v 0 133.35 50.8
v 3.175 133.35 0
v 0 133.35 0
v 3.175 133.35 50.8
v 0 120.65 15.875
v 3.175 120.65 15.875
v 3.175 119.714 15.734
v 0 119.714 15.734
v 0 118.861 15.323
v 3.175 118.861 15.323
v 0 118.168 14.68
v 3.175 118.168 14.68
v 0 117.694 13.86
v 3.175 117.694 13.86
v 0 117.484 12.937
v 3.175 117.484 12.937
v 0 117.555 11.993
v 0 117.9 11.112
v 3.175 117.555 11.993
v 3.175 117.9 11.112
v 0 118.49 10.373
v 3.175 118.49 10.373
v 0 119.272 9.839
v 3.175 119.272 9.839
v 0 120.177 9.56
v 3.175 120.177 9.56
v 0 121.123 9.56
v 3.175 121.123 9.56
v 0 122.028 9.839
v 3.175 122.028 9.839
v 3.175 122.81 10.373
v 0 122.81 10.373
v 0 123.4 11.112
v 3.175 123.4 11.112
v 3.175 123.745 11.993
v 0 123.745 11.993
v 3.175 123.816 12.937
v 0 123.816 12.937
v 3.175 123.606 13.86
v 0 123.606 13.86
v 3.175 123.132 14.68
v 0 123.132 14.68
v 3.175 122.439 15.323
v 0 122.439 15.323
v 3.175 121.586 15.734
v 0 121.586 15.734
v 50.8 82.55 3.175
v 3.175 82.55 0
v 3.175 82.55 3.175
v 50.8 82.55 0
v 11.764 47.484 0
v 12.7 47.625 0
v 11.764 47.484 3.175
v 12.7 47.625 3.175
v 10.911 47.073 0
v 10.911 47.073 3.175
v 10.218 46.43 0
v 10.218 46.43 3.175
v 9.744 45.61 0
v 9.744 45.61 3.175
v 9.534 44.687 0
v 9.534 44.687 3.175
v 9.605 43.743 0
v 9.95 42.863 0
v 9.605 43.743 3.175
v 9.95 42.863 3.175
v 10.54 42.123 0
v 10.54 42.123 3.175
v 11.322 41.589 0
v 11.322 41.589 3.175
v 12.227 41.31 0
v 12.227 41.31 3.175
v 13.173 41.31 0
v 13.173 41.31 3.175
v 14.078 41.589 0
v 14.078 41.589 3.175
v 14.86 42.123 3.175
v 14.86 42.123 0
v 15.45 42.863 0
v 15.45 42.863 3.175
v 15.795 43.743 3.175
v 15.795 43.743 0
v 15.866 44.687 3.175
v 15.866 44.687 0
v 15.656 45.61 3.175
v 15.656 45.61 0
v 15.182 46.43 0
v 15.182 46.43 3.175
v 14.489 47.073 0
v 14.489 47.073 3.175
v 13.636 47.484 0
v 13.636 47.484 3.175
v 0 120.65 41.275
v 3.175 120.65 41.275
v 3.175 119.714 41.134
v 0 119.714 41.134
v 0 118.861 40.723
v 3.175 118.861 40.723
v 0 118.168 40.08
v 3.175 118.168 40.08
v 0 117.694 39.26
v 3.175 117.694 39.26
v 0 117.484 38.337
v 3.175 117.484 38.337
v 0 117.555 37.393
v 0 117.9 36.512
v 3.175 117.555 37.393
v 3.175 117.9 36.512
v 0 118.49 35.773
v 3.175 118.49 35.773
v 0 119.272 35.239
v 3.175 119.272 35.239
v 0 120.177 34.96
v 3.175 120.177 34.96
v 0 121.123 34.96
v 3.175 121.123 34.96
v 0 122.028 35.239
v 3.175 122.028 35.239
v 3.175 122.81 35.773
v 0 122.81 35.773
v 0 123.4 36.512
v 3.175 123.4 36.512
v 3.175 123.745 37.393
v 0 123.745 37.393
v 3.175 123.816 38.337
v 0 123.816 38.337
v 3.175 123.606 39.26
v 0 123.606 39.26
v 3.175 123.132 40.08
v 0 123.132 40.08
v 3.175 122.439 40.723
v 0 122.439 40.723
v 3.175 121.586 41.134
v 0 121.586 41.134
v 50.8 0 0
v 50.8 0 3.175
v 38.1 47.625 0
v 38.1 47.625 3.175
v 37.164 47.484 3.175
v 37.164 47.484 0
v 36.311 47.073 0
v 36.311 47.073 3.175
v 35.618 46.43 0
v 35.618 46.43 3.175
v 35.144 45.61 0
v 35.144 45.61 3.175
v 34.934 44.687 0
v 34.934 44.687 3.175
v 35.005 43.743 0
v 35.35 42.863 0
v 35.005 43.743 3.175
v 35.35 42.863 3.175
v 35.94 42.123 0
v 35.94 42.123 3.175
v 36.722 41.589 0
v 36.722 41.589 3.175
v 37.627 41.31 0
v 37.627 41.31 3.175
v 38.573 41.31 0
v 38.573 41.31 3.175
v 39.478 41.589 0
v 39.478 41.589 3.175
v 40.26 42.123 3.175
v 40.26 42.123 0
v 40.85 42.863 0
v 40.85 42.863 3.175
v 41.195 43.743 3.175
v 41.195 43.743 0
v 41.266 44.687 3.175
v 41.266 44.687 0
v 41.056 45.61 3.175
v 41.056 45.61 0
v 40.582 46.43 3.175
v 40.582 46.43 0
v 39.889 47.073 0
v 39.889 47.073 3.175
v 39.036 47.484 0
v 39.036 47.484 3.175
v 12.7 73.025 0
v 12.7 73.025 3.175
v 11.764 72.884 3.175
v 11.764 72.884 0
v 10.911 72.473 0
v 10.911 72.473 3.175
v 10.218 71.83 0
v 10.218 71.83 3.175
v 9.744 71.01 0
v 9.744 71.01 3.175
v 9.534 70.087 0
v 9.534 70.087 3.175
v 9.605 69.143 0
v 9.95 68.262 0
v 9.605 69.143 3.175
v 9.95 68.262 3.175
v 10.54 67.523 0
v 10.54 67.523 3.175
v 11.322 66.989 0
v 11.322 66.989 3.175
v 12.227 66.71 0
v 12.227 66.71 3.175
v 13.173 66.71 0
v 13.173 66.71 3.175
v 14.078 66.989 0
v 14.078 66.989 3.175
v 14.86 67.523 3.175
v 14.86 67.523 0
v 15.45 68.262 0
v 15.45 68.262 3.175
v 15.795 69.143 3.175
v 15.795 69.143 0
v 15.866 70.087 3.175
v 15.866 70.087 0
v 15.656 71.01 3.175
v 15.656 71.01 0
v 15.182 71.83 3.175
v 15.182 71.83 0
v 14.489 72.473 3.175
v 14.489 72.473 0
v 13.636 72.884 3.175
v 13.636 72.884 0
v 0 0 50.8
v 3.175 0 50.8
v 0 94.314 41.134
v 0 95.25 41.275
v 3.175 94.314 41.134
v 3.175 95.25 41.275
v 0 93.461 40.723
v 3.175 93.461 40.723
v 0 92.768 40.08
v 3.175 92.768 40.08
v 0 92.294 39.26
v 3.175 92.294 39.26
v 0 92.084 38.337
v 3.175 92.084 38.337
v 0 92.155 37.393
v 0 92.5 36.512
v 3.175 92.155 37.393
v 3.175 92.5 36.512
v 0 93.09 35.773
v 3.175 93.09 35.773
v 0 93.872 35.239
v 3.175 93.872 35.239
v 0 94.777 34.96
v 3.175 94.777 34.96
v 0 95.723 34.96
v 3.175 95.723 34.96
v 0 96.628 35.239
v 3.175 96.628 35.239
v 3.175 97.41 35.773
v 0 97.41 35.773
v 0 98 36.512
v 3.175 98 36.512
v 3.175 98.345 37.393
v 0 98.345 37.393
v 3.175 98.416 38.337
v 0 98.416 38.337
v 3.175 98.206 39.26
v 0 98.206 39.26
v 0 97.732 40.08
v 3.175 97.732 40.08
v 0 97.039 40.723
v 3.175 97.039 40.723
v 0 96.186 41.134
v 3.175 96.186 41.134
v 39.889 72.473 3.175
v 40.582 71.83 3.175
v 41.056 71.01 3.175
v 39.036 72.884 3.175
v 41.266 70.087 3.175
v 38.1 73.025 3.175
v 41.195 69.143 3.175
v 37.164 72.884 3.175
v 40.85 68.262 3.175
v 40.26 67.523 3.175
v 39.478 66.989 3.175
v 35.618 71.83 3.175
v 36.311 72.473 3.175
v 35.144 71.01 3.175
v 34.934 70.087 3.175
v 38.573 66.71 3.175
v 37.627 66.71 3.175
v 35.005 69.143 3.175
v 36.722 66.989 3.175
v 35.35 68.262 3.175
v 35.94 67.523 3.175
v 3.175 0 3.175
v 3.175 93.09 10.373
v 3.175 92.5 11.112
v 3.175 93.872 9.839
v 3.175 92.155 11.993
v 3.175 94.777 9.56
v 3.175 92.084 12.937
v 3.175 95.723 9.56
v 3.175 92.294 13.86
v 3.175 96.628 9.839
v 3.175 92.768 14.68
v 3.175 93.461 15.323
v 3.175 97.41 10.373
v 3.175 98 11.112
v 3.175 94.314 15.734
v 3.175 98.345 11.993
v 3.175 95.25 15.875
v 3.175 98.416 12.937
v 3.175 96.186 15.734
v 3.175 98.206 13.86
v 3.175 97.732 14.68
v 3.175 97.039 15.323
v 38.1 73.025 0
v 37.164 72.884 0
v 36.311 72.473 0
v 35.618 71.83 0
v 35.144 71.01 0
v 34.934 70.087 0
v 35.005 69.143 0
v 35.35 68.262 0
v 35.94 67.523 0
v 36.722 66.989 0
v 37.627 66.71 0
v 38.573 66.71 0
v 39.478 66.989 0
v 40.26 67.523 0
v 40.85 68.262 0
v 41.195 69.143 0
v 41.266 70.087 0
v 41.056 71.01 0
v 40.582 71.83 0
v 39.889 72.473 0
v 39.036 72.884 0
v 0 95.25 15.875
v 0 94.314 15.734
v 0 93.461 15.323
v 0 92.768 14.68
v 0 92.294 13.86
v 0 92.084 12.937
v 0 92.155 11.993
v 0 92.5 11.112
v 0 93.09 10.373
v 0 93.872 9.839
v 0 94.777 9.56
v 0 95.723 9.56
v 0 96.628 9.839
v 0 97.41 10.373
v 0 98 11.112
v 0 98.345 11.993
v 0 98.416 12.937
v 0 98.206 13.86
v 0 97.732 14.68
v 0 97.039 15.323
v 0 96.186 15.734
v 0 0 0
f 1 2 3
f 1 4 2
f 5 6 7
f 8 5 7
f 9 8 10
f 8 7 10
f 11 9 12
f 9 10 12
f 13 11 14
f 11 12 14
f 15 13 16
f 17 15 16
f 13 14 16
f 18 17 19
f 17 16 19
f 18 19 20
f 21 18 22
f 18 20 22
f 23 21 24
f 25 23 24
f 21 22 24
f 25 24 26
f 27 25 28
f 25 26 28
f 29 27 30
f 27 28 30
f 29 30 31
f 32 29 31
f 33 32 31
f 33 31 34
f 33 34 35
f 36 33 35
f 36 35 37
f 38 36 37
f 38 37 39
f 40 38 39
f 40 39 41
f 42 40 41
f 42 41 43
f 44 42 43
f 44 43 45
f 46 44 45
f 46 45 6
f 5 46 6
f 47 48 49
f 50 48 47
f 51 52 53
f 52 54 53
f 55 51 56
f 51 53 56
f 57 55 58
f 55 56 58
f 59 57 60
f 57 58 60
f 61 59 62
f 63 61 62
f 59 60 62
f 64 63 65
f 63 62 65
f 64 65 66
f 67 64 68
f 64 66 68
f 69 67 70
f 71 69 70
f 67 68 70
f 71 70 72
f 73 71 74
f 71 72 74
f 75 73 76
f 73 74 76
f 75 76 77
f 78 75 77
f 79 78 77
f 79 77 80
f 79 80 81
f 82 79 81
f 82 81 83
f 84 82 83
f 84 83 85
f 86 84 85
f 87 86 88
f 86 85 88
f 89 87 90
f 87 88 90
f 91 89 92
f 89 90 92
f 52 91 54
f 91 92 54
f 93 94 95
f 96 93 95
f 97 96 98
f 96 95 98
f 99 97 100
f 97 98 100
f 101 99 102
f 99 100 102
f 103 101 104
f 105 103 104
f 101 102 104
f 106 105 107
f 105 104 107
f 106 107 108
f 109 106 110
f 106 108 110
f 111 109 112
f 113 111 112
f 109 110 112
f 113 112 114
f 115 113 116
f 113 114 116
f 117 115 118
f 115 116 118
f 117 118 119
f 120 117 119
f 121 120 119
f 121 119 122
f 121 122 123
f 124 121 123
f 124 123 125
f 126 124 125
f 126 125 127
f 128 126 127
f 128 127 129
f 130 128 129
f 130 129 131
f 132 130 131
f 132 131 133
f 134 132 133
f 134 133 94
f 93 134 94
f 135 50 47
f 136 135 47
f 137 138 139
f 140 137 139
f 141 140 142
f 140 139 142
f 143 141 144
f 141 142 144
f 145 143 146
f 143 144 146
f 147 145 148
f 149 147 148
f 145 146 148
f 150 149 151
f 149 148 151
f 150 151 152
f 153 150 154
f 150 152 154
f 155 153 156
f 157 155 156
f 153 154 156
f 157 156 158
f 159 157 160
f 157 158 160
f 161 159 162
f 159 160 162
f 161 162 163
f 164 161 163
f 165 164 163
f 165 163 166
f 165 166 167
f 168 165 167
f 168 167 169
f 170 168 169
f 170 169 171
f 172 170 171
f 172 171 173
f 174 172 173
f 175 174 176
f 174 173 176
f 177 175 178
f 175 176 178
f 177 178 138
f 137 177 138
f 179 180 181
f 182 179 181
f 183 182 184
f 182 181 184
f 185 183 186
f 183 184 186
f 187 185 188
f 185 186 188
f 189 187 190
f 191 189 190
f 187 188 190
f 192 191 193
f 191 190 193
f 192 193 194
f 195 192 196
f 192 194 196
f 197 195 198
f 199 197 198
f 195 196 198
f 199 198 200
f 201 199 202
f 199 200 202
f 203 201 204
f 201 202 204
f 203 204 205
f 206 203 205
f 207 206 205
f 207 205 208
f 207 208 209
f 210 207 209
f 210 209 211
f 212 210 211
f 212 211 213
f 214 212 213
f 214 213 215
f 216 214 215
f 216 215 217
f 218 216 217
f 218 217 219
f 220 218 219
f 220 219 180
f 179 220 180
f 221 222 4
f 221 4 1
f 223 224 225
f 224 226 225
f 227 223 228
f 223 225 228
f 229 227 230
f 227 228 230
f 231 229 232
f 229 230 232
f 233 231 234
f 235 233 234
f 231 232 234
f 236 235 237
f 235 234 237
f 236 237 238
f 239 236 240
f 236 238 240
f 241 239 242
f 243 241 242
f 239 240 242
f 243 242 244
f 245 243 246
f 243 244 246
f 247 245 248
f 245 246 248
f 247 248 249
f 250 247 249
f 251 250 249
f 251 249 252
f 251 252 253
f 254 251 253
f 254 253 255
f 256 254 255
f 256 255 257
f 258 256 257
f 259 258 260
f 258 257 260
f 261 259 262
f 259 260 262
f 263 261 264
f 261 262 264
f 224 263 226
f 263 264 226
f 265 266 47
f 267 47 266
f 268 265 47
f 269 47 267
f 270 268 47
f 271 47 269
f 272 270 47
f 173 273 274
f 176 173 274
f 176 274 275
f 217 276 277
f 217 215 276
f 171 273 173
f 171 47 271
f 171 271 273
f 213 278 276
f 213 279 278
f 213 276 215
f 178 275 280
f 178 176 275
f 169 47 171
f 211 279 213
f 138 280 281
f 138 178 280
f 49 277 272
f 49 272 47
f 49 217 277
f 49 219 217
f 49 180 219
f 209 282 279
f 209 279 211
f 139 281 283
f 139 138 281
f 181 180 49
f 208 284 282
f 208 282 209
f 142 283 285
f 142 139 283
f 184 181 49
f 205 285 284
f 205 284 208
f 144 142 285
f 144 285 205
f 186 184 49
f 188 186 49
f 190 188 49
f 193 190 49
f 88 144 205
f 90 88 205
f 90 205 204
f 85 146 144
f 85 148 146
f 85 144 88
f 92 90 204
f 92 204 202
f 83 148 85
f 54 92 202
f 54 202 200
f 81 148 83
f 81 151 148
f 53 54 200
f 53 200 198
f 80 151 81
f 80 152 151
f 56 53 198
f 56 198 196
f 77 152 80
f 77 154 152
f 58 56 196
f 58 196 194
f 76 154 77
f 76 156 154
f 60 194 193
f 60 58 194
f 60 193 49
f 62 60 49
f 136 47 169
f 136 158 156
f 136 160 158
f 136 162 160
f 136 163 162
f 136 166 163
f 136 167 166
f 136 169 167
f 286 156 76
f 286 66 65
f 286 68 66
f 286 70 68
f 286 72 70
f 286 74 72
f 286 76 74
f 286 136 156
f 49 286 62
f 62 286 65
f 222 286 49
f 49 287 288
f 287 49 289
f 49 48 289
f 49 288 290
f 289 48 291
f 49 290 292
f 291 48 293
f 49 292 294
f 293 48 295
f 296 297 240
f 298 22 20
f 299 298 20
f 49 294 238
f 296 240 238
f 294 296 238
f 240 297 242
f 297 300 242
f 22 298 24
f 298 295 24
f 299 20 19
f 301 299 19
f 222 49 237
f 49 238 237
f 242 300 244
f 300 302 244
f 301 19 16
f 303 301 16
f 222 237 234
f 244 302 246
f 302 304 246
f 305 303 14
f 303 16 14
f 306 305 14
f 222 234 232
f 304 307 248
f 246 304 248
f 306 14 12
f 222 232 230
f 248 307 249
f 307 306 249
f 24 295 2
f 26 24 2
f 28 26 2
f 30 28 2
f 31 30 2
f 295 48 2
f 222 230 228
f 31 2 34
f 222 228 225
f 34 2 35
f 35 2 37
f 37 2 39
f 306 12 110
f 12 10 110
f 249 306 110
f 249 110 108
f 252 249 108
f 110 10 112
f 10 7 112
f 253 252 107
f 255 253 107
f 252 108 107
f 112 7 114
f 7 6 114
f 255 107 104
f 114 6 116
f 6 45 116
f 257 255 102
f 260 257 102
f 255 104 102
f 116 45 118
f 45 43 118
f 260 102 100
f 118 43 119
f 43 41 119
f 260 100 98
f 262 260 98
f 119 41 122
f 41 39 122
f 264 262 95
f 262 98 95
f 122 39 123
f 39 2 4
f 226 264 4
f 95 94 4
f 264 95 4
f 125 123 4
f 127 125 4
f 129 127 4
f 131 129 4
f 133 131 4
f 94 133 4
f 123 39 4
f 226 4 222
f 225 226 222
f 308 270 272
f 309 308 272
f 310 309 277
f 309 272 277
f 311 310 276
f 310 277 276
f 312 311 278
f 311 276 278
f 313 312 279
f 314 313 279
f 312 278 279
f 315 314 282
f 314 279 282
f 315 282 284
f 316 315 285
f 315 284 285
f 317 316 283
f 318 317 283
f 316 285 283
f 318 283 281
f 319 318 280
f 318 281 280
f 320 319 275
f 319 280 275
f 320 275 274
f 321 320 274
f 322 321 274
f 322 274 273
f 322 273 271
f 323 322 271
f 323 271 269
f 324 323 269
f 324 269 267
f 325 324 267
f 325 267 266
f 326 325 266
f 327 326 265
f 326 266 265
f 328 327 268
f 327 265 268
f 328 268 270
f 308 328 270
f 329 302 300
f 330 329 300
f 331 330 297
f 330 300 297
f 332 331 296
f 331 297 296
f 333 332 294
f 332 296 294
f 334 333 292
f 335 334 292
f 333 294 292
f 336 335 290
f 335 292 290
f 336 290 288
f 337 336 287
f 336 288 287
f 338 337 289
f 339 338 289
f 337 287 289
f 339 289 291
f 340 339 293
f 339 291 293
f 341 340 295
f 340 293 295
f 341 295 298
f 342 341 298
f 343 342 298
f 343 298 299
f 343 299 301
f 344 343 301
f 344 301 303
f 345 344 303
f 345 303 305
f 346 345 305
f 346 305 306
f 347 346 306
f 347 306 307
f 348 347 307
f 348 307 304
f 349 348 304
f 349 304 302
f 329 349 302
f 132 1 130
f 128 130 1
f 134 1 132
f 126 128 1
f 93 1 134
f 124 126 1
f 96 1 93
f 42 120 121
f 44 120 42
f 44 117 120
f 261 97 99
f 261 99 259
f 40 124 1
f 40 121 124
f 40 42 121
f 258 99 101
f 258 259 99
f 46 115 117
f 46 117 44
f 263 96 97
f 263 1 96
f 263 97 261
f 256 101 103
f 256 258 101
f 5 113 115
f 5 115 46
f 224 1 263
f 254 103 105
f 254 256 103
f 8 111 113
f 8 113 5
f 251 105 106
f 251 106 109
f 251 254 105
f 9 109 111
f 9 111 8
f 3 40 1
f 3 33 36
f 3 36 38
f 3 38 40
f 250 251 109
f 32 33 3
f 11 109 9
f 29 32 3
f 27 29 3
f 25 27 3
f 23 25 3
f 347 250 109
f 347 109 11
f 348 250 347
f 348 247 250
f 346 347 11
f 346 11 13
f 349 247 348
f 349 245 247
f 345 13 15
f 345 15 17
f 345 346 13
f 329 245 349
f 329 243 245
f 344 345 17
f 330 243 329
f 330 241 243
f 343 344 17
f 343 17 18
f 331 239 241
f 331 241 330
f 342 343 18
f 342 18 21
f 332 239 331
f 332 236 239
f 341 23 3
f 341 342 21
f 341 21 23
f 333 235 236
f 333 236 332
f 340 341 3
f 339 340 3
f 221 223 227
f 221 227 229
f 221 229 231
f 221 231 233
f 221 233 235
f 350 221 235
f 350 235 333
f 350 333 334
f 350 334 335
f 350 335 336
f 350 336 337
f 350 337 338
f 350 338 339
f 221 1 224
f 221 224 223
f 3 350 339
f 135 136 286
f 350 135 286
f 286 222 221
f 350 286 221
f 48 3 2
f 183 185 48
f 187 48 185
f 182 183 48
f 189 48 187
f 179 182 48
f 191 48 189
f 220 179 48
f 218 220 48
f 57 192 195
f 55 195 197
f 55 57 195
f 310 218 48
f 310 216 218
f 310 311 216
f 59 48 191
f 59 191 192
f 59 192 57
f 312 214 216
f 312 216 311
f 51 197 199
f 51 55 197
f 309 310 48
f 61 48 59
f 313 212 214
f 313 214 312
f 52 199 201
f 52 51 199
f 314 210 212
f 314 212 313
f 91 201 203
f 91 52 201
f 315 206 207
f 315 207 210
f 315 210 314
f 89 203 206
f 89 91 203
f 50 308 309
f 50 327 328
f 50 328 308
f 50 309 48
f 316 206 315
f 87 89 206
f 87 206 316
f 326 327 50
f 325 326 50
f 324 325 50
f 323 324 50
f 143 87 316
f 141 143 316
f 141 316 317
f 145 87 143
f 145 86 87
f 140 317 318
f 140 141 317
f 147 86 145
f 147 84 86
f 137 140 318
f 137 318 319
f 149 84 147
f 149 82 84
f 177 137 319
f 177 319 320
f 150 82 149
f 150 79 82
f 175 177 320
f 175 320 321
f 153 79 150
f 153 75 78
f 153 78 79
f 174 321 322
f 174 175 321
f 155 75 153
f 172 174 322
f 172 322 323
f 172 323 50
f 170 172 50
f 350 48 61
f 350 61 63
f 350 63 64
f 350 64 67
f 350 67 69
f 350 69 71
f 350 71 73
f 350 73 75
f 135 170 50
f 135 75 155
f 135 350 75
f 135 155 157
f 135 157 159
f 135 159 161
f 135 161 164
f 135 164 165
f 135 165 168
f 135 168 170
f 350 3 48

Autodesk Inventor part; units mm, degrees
ref_plane "YZ Plane" through (0, 0, 0) normal (1, 0, 0) x (0, 1, 0)
ref_plane "XZ Plane" through (0, 0, 0) normal (0, 1, 0) x (-1, 0, 0)
ref_plane "XY Plane" through (0, 0, 0) normal (0, 0, 1) x (1, 0, 0)
sketch "Sketch1" plane through (0, 0, 0) normal (0, 1, 0) x (-1, 0, 0)
  line L0 (0, 0) -> (-3.175, 0)
  line L1 (-3.175, 0) -> (-3.175, 50.8)
  line L2 (-3.175, 50.8) -> (0, 50.8)
  line L3 (0, 50.8) -> (0, 0)
  line L4 (0, 0) -> (-50.8, 0)
  line L5 (-50.8, 0) -> (-50.8, 3.175)
  line L6 (-50.8, 3.175) -> (0, 3.175)
  line L7 (0, 3.175) -> (0, 0)
  dimension "d0" = 3.175
  dimension "d1" = 50.8
  dimension "d2" = 50.8
  dimension "d3" = 3.175
extrude "Extrusion1" add sketch "Sketch1" along normal blind 133.35
sketch "Sketch2" plane through (0, 0, 0) normal (-1, 0, 0) x (0, 0, 1)
  line L0 (0, 0) -> (50.8, 0) projected
  line L1 (50.8, 0) -> (50.8, 133.35) projected
  line L2 (0, 133.35) -> (50.8, 133.35) projected
  line L3 (0, 0) -> (0, 133.35) projected
  point P0 (12.7, 120.65)
  point P1 (38.1, 120.65)
  point P2 (38.1, 95.25)
  point P3 (12.7, 95.25)
  dimension "d6" = 12.7
  dimension "d7" = 12.7
  dimension "d8" = 12.7
  dimension "d9" = 12.7
  dimension "d10" = 12.7
  dimension "d11" = 38.1
  dimension "d12" = 12.7
  dimension "d13" = 38.1
hole "Hole1" at (0, 120.65, 12.7) at (0, 120.65, 38.1) at (0, 95.25, 38.1) at (0, 95.25, 12.7) direction (1, 0, 0) diameter 6.35 end through all
sketch "Sketch3" plane through (50.8, 0, 0) normal (0, 0, -1) x (-1, 0, 0)
  line L0 (0, 0) -> (50.8, 0) projected
  line L1 (50.8, 0) -> (50.8, 133.35) projected
  line L2 (0, 133.35) -> (50.8, 133.35) projected
  line L3 (0, 0) -> (0, 133.35) projected
  point P0 (12.7, 69.85)
  point P1 (38.1, 69.85)
  point P2 (38.1, 44.45)
  point P3 (12.7, 44.45)
  dimension "d21" = 12.7
  dimension "d22" = 12.7
  dimension "d23" = 63.5
  dimension "d24" = 63.5
  dimension "d34" = 12.7
  dimension "d35" = 88.9
  dimension "d36" = 88.9
  dimension "d37" = 12.7
sketch "Sketch4" plane through (0, 133.35, 0) normal (0, 1, 0) x (1, 0, 0)
  line L0 (0, 0) -> (0, -50.8) projected
  line L1 (0, -50.8) -> (3.175, -50.8) projected
  line L2 (3.175, -50.8) -> (3.175, -3.175) projected
  line L3 (3.175, -3.175) -> (50.8, -3.175) projected
  line L4 (50.8, -3.175) -> (50.8, 0) projected
  line L5 (50.8, 0) -> (0, 0) projected
  line L6 (50.8, 0) -> (3.175, 0)
  line L7 (3.175, 0) -> (3.175, -3.175)
  line L8 (3.175, -3.175) -> (50.8, -3.175)
  line L9 (50.8, -3.175) -> (50.8, 0)
extrude "Extrusion2" cut sketch "Sketch4" against normal blind 50.8 contours L5 L4 L3 L7
hole "Hole3" at (38.1, 69.85, 0) at (12.7, 69.85, 0) at (12.7, 44.45, 0) at (38.1, 44.45, 0) direction (0, 0, 1) diameter 6.35 end through all
properties part number "2x2 angle vertical left"
